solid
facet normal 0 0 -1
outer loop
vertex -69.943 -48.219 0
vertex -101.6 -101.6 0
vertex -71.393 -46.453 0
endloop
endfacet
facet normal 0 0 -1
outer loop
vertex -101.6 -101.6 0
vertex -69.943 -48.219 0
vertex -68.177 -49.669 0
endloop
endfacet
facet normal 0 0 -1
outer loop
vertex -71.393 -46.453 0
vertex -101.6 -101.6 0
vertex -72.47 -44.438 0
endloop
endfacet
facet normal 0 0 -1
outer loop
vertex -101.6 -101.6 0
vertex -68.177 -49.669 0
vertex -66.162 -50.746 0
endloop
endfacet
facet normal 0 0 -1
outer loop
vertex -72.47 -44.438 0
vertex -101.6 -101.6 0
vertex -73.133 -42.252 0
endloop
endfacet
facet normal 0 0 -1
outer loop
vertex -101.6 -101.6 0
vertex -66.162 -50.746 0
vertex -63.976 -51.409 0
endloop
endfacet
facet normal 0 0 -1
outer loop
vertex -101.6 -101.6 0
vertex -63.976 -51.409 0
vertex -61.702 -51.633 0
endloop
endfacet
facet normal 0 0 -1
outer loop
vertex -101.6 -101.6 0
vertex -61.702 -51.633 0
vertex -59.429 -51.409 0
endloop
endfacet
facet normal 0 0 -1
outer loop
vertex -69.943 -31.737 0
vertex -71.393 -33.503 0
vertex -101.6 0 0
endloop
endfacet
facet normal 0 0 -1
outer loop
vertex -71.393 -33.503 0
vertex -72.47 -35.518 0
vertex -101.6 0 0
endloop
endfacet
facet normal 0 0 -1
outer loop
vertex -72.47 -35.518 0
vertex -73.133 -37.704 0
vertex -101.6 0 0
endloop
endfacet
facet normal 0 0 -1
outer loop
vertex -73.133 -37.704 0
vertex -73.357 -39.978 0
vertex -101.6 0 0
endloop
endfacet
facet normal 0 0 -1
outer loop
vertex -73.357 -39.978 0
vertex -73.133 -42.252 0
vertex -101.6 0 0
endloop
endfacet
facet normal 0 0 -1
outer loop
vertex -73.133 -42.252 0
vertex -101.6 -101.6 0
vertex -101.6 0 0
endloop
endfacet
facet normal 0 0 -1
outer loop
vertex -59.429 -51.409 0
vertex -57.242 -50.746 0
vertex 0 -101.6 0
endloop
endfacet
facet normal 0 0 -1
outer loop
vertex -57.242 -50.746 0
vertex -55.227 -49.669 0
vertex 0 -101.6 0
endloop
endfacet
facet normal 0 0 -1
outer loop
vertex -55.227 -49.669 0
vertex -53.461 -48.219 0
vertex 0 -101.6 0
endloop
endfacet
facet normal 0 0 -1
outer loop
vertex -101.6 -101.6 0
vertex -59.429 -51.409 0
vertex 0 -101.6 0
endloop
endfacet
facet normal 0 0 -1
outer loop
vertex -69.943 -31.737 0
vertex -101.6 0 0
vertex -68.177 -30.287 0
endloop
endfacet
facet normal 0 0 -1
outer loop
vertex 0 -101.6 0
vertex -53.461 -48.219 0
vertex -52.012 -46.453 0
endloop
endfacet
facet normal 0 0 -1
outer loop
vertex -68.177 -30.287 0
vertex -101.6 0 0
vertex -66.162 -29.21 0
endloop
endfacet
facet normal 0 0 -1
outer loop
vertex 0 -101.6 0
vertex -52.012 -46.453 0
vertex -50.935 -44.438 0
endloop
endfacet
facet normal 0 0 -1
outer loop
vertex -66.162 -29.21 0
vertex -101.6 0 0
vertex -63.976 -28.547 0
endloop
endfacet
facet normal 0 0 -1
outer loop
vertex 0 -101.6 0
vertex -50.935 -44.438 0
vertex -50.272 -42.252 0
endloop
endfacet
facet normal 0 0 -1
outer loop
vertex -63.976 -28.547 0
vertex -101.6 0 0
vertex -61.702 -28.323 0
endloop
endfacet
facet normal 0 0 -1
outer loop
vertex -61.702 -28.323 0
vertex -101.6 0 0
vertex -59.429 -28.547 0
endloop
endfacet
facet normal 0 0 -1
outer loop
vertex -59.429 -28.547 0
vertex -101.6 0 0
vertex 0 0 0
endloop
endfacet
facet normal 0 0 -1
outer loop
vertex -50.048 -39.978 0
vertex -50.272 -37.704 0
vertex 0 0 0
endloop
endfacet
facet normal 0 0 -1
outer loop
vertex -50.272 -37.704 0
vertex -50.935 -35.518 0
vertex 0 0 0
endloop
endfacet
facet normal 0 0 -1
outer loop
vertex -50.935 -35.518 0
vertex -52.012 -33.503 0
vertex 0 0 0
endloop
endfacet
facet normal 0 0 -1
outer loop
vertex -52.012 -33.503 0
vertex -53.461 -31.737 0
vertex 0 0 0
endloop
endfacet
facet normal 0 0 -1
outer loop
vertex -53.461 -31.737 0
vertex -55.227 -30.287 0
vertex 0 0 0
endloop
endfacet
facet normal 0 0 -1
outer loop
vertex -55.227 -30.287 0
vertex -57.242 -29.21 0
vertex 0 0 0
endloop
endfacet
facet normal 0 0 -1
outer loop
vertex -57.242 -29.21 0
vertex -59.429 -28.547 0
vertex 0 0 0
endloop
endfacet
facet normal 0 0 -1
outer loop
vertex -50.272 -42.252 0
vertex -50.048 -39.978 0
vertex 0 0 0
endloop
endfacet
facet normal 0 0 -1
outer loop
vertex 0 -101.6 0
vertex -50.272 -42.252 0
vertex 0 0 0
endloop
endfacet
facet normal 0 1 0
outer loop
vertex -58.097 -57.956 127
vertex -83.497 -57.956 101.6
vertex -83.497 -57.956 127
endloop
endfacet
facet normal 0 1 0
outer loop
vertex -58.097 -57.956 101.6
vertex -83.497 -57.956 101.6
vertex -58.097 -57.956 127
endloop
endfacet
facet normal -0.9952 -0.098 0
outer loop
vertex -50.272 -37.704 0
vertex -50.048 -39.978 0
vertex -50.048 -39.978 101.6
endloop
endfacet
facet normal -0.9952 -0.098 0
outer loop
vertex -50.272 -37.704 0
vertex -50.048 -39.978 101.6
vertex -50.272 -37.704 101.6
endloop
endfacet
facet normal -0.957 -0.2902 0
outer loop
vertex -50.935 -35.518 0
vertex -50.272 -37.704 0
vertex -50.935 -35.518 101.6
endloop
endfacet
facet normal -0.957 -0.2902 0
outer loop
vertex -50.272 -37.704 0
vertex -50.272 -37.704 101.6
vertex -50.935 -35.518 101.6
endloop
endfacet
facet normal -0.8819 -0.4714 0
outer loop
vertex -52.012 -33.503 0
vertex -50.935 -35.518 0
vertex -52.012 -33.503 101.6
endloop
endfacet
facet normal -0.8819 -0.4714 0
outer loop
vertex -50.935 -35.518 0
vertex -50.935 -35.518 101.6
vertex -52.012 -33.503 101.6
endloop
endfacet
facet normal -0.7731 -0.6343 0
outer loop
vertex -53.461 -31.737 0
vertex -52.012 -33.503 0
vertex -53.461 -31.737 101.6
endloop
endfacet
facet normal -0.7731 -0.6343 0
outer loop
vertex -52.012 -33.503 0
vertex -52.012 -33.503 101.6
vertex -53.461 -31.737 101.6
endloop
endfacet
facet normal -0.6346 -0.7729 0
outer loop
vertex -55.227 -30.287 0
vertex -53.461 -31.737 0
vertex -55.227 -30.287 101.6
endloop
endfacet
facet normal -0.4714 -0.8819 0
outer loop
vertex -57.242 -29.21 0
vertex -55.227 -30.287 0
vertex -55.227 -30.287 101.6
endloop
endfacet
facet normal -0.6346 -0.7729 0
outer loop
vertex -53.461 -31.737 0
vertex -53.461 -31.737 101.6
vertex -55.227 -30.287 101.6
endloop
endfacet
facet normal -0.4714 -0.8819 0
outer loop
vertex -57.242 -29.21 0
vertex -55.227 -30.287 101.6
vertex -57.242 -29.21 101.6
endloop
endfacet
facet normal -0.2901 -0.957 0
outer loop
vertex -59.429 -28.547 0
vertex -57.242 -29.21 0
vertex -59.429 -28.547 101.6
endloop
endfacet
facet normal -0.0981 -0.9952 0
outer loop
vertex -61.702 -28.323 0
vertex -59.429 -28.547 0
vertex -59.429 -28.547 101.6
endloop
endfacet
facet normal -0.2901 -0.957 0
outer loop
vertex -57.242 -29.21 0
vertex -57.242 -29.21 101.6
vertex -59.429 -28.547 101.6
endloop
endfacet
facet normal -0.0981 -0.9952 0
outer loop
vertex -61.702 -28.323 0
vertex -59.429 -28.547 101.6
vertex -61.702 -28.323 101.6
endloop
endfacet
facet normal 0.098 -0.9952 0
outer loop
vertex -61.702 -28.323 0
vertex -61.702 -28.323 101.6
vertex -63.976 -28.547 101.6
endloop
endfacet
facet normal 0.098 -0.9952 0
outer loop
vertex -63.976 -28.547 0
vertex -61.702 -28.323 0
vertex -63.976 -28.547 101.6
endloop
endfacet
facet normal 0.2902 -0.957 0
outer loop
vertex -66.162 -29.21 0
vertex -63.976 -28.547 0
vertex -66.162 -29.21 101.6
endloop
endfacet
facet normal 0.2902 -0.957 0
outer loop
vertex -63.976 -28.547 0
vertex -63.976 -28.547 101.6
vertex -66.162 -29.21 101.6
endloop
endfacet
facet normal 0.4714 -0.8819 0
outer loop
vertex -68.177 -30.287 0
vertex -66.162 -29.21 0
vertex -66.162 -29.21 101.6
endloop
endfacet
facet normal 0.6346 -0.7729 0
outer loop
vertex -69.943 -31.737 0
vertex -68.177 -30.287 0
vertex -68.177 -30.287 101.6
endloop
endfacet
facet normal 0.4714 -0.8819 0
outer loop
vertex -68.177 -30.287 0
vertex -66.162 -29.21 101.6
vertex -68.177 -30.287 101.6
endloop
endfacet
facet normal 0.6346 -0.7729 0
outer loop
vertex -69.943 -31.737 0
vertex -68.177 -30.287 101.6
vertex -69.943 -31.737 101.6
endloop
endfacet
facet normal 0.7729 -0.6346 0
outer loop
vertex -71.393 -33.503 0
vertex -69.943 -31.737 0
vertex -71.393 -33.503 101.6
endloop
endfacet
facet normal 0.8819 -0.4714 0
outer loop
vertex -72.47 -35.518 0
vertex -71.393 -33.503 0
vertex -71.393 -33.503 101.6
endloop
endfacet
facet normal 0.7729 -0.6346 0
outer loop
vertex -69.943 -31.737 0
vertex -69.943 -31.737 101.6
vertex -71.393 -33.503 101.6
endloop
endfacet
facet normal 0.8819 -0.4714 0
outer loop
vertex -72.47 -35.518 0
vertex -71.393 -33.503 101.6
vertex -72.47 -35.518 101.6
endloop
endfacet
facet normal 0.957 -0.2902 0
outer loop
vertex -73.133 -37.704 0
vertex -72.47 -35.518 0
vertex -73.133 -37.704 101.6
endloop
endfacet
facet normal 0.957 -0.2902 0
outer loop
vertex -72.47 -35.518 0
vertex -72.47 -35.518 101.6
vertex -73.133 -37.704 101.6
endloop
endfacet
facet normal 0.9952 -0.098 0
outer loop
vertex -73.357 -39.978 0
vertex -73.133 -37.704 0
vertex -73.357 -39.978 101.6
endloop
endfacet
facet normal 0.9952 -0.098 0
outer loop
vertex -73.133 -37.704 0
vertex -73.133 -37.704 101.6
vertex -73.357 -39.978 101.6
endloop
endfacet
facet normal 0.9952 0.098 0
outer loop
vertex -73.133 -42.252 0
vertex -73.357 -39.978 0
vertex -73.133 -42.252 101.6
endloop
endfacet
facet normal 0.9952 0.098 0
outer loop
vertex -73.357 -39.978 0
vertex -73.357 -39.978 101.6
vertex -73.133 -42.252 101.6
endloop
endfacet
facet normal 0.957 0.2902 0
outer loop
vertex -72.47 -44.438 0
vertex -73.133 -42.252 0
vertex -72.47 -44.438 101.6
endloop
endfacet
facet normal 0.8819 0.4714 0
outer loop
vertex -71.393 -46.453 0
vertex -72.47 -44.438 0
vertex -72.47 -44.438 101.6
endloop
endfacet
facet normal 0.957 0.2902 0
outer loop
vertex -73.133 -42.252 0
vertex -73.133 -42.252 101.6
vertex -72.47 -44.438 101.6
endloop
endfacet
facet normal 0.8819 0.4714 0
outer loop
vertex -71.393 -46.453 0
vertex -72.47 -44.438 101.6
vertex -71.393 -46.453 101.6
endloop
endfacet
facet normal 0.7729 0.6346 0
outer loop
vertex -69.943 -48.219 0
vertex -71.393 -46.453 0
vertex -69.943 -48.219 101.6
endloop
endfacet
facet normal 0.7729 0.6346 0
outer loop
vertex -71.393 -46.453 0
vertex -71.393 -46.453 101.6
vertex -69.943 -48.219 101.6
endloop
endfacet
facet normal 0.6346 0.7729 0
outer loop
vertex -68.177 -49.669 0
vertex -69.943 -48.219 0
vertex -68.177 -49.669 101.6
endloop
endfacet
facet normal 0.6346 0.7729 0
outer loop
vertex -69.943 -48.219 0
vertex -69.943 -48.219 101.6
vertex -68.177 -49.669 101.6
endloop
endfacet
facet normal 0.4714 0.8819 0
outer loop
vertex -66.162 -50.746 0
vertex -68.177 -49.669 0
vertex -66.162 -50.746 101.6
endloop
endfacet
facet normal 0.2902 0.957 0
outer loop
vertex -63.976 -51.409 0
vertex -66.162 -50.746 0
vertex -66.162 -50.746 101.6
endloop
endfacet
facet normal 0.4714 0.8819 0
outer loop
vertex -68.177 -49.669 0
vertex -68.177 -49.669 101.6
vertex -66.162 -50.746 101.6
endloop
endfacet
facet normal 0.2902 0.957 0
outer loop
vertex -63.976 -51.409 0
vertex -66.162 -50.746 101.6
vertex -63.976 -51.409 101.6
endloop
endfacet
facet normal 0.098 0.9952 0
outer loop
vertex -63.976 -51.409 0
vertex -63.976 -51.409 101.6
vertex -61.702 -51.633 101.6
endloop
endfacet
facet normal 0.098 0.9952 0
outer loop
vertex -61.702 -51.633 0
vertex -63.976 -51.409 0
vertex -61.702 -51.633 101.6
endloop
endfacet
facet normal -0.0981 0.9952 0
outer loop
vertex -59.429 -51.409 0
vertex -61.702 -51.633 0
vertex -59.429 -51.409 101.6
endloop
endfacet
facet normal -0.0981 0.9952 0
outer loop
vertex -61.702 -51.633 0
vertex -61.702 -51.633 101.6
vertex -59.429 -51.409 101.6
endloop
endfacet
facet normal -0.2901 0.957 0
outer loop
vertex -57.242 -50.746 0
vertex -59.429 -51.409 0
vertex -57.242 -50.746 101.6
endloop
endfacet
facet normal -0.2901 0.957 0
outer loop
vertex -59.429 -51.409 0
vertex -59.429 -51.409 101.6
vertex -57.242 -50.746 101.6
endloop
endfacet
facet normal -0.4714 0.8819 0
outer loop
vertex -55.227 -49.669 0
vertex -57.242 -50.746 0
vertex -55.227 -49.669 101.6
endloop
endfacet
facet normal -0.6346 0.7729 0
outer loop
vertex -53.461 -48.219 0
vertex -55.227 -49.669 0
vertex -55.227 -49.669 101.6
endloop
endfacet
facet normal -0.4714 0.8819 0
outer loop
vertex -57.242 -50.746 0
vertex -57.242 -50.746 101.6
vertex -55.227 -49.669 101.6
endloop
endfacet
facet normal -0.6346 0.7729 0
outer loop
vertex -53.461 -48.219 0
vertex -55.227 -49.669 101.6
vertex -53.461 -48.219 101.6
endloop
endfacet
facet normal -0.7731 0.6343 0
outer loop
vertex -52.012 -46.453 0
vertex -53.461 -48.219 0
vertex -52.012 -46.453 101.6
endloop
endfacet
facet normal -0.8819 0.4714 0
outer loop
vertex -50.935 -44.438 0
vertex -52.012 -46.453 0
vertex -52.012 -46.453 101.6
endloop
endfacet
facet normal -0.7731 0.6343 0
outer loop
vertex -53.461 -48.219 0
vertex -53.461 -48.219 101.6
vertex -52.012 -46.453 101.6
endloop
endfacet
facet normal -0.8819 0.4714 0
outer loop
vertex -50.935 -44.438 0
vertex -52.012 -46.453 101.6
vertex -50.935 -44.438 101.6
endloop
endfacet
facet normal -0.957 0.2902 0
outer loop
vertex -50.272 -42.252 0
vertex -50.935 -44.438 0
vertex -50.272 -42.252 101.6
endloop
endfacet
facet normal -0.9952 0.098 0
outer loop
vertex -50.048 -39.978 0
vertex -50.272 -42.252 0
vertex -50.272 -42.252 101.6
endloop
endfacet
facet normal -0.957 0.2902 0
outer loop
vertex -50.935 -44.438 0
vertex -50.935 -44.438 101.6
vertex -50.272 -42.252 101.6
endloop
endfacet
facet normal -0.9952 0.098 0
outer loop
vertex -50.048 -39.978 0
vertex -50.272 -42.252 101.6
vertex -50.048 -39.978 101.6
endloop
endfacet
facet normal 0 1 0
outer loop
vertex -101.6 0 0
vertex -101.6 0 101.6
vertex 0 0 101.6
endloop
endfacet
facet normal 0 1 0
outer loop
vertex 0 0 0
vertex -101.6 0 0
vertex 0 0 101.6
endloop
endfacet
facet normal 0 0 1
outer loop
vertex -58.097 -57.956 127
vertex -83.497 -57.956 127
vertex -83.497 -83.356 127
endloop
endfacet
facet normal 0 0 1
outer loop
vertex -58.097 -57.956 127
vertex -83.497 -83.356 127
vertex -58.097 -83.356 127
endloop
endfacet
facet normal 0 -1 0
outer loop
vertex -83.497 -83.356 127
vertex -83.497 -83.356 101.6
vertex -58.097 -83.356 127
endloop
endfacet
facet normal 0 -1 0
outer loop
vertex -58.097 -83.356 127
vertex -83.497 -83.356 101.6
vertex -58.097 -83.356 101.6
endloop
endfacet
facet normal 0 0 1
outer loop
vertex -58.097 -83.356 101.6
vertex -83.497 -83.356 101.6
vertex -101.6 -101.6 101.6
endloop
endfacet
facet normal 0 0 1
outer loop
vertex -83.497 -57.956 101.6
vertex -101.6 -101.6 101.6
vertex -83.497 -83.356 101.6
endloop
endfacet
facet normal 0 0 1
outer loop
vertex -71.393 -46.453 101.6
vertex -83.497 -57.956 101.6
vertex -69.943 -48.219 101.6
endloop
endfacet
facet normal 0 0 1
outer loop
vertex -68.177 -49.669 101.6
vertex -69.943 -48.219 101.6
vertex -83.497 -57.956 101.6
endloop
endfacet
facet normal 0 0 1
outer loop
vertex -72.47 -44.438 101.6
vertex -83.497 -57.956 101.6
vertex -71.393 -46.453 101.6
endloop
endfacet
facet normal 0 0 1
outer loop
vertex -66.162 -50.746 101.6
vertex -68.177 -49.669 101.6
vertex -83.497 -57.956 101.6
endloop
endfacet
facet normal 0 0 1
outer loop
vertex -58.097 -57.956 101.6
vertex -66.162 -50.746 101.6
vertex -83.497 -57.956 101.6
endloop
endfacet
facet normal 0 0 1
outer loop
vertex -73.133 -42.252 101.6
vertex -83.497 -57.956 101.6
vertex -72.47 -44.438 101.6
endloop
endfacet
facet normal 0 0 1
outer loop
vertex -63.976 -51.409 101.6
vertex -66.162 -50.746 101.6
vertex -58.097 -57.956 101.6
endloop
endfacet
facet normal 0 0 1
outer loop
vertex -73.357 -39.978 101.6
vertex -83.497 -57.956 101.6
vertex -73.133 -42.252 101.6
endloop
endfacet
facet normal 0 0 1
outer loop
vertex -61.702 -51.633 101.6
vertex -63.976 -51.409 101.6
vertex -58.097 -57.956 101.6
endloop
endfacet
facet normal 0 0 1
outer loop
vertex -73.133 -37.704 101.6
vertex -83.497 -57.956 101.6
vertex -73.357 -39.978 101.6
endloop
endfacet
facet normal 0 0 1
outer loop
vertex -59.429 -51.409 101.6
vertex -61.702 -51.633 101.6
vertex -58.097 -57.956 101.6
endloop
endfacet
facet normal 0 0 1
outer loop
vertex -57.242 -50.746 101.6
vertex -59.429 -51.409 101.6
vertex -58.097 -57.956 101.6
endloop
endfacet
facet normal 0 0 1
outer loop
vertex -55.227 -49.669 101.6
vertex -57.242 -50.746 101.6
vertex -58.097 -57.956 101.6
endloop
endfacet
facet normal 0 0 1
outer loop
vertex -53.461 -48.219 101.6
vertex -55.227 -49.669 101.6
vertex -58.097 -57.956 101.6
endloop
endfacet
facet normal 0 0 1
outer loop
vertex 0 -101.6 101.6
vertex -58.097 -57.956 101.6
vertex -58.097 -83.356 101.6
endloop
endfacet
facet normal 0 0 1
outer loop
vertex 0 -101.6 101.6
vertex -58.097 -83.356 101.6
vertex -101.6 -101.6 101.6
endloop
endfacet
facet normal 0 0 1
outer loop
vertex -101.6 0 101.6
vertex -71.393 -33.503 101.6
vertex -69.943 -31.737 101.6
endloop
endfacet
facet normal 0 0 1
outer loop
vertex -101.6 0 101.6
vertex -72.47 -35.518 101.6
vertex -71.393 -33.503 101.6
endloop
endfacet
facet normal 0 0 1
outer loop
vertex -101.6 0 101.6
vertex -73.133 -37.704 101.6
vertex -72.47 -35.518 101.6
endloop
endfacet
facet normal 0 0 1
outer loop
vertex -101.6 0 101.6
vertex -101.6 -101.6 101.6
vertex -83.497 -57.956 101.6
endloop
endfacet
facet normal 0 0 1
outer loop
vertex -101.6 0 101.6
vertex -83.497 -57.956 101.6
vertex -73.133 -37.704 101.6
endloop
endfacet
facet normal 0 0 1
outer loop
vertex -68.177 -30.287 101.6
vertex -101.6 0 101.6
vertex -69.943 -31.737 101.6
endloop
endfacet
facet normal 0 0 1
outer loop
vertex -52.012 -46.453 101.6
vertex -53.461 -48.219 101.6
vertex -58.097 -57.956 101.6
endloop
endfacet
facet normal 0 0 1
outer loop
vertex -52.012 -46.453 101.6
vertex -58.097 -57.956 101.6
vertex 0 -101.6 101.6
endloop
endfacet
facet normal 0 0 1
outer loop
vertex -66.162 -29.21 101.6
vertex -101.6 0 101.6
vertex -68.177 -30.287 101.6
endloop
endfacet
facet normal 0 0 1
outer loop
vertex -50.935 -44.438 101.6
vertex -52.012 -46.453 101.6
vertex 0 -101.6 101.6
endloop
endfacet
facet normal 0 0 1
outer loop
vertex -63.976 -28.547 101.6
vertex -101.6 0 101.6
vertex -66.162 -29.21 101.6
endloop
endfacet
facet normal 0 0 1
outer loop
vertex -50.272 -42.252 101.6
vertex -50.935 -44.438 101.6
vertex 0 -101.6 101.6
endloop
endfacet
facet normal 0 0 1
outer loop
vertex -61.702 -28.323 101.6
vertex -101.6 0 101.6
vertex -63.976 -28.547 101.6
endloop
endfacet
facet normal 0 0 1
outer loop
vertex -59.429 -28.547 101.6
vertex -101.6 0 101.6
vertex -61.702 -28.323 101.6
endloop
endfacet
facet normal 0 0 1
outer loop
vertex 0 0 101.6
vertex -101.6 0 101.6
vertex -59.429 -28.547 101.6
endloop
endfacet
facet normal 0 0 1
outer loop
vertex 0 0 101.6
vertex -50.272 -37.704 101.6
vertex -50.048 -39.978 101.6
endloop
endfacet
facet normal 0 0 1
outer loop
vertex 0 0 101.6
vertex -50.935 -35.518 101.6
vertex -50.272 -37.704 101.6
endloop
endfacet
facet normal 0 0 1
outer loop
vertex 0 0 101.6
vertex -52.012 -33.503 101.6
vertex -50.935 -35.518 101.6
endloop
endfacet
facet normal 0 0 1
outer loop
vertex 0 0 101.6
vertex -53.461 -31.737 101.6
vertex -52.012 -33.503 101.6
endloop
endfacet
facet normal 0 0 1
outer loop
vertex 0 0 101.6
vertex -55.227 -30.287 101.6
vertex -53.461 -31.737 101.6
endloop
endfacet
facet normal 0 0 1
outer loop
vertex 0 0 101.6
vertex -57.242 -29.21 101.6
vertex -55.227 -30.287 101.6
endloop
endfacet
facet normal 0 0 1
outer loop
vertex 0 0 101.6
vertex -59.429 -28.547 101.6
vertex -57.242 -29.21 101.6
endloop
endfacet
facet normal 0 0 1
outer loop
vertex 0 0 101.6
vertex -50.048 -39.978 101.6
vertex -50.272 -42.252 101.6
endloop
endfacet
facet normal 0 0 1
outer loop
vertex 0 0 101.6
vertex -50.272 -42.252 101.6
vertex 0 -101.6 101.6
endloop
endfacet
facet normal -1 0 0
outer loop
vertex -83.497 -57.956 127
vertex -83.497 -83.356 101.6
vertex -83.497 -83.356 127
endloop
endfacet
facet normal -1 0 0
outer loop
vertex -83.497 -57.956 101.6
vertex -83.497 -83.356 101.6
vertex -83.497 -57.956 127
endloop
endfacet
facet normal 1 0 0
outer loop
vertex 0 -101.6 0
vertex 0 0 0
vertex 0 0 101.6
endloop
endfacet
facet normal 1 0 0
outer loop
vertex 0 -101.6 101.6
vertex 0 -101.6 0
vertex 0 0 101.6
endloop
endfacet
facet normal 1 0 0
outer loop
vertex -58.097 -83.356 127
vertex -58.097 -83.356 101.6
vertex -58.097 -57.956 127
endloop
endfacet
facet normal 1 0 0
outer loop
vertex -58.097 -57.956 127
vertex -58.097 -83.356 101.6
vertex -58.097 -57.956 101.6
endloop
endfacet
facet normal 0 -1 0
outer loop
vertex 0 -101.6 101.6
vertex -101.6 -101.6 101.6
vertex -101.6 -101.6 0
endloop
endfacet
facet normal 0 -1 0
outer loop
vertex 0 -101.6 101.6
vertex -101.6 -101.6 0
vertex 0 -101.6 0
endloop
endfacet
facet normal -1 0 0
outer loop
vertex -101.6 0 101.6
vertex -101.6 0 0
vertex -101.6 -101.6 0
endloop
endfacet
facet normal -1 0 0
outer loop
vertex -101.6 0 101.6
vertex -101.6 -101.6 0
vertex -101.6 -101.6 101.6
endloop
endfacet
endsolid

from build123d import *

# Parameters (mm, degrees)
F0_W     = 101.6
F0_H     = 101.6
F1_DEPTH = 101.6
F2_R     = 11.654727
F3_DEPTH = 101.6
F4_W     = 25.4
F4_H     = 25.4
F5_DEPTH = 25.4


with BuildPart() as f1:
    # F0 (on Front) → F1 (new body)
    with BuildSketch(Plane.XZ):
        with Locations((-50.8, 50.8)):
            Rectangle(F0_W, F0_H)
    extrude(amount=F1_DEPTH)

    # F2 (on face) → F3 (cut)
    with BuildSketch(Plane.XY.offset(101.6)):
        with Locations((-61.702333, -39.977964)):
            Circle(F2_R)
    extrude(amount=-F3_DEPTH, mode=Mode.SUBTRACT)

    # F4 (on face) → F5 (join)
    with BuildSketch(Plane.XY.offset(101.6)):
        with Locations((-70.796629, -70.656015)):
            Rectangle(F4_W, F4_H)
    extrude(amount=F5_DEPTH)


solid = f1.part
